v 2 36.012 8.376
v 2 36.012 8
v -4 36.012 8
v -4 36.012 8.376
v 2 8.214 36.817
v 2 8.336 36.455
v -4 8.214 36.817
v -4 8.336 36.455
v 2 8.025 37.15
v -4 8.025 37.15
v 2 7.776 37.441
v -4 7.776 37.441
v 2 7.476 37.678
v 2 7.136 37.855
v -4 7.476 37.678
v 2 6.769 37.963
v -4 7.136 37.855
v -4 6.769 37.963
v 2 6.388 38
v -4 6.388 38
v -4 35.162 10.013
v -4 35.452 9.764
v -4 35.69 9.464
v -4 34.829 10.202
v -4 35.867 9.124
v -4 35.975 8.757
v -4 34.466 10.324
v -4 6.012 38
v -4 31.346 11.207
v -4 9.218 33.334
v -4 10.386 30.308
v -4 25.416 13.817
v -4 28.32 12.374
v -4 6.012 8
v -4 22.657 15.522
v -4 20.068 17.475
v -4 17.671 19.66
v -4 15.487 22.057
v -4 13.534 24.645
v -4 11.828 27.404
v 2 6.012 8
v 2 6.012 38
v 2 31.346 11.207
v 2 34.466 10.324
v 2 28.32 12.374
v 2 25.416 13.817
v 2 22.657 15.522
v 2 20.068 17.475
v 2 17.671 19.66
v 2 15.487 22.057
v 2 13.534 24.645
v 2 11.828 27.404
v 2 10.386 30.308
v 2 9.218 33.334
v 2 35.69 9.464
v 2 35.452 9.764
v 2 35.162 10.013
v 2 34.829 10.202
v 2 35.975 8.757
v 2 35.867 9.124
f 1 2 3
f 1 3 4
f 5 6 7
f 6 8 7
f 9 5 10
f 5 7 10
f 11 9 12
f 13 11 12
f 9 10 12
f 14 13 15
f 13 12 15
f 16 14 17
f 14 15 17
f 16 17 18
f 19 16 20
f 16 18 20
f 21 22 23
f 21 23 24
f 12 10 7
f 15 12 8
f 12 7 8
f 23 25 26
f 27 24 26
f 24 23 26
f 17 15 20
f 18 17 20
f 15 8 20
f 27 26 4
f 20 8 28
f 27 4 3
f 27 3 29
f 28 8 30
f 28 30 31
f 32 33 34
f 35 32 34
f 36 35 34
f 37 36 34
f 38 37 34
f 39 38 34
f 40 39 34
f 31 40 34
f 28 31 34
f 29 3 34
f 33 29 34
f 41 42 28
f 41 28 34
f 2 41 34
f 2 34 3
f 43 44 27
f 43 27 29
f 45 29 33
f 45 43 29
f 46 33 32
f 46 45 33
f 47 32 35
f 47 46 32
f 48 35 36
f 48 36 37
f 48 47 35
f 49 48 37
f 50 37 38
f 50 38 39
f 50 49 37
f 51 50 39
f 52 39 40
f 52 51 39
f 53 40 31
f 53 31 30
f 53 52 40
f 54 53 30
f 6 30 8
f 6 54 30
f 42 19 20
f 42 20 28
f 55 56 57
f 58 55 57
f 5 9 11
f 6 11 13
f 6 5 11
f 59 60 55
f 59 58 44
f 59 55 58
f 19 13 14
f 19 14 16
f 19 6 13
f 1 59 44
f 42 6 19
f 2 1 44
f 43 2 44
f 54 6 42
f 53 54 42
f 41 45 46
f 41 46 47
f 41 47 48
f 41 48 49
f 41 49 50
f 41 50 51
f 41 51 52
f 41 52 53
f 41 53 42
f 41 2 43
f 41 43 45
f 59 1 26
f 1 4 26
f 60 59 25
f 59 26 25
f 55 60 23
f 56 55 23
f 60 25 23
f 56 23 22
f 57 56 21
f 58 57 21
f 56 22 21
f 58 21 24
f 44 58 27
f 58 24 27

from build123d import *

# Parameters (mm, degrees)
PAD012_DEPTH            = 6
FILLET002_R             = 2
FILLET003_R             = 2
BODY011_PLACEMENT_ANGLE = 180


with BuildPart() as part:
    # Sketch025 → Pad012 (new body)
    with BuildSketch(Plane.YZ):
        with BuildLine():
            Line((6.011752, 0), (36.011752, 0))
            Line((36.011752, 0), (36.011752, -2))
            ThreePointArc((36.011752, -2), (17.671346, -11.659594), (8.011752, -30))
            Line((8.011752, -30), (6.011752, -30))
            Line((6.011752, -30), (6.011752, 0))
        make_face()
    extrude(amount=PAD012_DEPTH)

    # Fillet002
    fillet002_edges = [part.edges().sort_by_distance(p)[0] for p in [
        (3, 36.011752, -2),
    ]]
    fillet(fillet002_edges, radius=FILLET002_R)

    # Fillet003
    fillet003_edges = [part.edges().sort_by_distance(p)[0] for p in [
        (3, 8.011752, -30),
    ]]
    fillet(fillet003_edges, radius=FILLET003_R)


with BuildPart() as part_1:
    # Body011 placement: moved
    add(part.part.moved(Location((2, 0, 8))).rotate(Axis((2, 0, 8), (0, 1, 0)), BODY011_PLACEMENT_ANGLE))


solid = part_1.part
